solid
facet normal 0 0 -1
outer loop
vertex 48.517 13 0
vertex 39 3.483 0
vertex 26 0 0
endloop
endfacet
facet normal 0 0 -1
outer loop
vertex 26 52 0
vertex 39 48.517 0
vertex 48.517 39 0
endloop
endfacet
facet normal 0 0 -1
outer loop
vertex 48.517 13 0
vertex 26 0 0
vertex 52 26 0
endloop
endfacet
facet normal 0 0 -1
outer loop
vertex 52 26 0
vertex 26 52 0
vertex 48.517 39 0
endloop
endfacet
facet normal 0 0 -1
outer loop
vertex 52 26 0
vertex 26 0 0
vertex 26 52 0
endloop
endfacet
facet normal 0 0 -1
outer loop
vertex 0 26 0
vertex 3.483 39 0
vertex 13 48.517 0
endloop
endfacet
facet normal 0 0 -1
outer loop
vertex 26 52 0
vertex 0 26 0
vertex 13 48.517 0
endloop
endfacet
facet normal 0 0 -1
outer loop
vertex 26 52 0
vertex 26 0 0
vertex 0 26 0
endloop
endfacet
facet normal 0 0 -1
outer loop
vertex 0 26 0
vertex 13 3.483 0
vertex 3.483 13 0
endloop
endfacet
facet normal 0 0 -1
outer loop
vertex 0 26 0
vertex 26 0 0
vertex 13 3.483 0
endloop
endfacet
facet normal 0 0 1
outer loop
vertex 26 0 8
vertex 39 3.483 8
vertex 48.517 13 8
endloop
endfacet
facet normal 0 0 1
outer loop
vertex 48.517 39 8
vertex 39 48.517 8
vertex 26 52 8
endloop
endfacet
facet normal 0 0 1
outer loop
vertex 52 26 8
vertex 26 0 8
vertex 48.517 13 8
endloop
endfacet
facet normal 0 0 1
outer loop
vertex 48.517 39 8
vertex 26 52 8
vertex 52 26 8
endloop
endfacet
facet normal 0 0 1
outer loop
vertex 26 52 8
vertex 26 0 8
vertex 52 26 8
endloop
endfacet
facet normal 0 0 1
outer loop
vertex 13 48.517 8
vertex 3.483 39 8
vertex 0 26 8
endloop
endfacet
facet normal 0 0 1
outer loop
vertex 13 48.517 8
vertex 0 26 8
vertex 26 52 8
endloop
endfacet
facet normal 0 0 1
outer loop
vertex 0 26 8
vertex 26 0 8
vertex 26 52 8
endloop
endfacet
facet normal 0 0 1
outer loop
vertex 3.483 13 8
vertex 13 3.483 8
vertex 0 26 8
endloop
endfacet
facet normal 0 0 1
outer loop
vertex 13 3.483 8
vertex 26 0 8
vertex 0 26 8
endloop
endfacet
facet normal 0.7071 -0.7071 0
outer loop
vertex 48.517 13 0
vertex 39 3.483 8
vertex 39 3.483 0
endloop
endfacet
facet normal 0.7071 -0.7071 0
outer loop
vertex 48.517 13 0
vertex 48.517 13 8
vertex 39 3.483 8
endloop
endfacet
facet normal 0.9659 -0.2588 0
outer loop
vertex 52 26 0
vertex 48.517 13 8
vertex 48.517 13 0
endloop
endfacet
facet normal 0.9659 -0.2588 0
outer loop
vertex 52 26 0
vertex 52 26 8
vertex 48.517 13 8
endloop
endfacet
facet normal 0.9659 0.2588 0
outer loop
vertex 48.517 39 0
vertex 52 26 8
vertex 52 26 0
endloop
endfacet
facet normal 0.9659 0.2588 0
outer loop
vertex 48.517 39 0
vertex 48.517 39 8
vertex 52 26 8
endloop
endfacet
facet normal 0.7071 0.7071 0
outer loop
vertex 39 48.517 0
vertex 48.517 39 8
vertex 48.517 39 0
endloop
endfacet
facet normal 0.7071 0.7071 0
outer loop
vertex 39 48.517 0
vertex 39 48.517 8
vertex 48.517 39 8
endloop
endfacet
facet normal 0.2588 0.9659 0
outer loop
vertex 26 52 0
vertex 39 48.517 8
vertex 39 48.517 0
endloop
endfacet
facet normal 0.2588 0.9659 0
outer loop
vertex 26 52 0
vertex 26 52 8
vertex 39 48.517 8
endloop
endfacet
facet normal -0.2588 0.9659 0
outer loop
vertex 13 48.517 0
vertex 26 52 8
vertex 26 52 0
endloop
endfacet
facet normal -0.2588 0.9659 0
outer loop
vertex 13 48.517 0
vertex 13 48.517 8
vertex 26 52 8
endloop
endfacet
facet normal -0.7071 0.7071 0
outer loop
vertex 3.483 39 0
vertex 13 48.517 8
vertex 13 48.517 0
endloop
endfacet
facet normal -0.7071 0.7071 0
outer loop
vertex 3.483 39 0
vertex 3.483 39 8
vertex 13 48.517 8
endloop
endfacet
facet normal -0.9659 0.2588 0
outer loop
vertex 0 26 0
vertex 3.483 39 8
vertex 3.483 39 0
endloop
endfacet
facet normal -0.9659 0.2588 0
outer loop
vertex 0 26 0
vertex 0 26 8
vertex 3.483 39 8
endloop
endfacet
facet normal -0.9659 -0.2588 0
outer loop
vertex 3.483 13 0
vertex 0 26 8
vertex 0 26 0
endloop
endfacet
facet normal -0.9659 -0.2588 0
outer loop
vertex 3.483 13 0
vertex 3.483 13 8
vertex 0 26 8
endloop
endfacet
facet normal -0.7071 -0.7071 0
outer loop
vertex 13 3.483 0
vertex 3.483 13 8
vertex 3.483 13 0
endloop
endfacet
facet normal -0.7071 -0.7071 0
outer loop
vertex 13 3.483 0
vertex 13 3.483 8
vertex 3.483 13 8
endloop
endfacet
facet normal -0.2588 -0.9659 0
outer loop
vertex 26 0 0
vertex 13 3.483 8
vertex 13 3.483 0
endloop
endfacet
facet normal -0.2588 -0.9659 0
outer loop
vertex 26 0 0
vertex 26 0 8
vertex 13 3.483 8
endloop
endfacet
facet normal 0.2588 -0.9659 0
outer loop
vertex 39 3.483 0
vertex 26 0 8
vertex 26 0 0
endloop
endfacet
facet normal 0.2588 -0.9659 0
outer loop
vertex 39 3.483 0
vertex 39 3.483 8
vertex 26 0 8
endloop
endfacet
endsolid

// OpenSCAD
$fn = 32;

// ----------------------------------------------------------------------
// Flat adaptor: keyed, 8 mm thick
// ----------------------------------------------------------------------

// --- parameters (mm) ---
profile_height = 8;       // extrusion height
profile_points = 12;      // points of the closed outline

profile = [[0, 26], [3.483, 13], [13, 3.483], [26, 0], [39, 3.483], [48.517, 13], [52, 26], [48.517, 39], [39, 48.517], [26, 52], [13, 48.517], [3.483, 39]];  // single closed polygon, 12 points, counter clockwise

// --- the one profile operation ---
linear_extrude(height = profile_height) polygon(points = profile);
